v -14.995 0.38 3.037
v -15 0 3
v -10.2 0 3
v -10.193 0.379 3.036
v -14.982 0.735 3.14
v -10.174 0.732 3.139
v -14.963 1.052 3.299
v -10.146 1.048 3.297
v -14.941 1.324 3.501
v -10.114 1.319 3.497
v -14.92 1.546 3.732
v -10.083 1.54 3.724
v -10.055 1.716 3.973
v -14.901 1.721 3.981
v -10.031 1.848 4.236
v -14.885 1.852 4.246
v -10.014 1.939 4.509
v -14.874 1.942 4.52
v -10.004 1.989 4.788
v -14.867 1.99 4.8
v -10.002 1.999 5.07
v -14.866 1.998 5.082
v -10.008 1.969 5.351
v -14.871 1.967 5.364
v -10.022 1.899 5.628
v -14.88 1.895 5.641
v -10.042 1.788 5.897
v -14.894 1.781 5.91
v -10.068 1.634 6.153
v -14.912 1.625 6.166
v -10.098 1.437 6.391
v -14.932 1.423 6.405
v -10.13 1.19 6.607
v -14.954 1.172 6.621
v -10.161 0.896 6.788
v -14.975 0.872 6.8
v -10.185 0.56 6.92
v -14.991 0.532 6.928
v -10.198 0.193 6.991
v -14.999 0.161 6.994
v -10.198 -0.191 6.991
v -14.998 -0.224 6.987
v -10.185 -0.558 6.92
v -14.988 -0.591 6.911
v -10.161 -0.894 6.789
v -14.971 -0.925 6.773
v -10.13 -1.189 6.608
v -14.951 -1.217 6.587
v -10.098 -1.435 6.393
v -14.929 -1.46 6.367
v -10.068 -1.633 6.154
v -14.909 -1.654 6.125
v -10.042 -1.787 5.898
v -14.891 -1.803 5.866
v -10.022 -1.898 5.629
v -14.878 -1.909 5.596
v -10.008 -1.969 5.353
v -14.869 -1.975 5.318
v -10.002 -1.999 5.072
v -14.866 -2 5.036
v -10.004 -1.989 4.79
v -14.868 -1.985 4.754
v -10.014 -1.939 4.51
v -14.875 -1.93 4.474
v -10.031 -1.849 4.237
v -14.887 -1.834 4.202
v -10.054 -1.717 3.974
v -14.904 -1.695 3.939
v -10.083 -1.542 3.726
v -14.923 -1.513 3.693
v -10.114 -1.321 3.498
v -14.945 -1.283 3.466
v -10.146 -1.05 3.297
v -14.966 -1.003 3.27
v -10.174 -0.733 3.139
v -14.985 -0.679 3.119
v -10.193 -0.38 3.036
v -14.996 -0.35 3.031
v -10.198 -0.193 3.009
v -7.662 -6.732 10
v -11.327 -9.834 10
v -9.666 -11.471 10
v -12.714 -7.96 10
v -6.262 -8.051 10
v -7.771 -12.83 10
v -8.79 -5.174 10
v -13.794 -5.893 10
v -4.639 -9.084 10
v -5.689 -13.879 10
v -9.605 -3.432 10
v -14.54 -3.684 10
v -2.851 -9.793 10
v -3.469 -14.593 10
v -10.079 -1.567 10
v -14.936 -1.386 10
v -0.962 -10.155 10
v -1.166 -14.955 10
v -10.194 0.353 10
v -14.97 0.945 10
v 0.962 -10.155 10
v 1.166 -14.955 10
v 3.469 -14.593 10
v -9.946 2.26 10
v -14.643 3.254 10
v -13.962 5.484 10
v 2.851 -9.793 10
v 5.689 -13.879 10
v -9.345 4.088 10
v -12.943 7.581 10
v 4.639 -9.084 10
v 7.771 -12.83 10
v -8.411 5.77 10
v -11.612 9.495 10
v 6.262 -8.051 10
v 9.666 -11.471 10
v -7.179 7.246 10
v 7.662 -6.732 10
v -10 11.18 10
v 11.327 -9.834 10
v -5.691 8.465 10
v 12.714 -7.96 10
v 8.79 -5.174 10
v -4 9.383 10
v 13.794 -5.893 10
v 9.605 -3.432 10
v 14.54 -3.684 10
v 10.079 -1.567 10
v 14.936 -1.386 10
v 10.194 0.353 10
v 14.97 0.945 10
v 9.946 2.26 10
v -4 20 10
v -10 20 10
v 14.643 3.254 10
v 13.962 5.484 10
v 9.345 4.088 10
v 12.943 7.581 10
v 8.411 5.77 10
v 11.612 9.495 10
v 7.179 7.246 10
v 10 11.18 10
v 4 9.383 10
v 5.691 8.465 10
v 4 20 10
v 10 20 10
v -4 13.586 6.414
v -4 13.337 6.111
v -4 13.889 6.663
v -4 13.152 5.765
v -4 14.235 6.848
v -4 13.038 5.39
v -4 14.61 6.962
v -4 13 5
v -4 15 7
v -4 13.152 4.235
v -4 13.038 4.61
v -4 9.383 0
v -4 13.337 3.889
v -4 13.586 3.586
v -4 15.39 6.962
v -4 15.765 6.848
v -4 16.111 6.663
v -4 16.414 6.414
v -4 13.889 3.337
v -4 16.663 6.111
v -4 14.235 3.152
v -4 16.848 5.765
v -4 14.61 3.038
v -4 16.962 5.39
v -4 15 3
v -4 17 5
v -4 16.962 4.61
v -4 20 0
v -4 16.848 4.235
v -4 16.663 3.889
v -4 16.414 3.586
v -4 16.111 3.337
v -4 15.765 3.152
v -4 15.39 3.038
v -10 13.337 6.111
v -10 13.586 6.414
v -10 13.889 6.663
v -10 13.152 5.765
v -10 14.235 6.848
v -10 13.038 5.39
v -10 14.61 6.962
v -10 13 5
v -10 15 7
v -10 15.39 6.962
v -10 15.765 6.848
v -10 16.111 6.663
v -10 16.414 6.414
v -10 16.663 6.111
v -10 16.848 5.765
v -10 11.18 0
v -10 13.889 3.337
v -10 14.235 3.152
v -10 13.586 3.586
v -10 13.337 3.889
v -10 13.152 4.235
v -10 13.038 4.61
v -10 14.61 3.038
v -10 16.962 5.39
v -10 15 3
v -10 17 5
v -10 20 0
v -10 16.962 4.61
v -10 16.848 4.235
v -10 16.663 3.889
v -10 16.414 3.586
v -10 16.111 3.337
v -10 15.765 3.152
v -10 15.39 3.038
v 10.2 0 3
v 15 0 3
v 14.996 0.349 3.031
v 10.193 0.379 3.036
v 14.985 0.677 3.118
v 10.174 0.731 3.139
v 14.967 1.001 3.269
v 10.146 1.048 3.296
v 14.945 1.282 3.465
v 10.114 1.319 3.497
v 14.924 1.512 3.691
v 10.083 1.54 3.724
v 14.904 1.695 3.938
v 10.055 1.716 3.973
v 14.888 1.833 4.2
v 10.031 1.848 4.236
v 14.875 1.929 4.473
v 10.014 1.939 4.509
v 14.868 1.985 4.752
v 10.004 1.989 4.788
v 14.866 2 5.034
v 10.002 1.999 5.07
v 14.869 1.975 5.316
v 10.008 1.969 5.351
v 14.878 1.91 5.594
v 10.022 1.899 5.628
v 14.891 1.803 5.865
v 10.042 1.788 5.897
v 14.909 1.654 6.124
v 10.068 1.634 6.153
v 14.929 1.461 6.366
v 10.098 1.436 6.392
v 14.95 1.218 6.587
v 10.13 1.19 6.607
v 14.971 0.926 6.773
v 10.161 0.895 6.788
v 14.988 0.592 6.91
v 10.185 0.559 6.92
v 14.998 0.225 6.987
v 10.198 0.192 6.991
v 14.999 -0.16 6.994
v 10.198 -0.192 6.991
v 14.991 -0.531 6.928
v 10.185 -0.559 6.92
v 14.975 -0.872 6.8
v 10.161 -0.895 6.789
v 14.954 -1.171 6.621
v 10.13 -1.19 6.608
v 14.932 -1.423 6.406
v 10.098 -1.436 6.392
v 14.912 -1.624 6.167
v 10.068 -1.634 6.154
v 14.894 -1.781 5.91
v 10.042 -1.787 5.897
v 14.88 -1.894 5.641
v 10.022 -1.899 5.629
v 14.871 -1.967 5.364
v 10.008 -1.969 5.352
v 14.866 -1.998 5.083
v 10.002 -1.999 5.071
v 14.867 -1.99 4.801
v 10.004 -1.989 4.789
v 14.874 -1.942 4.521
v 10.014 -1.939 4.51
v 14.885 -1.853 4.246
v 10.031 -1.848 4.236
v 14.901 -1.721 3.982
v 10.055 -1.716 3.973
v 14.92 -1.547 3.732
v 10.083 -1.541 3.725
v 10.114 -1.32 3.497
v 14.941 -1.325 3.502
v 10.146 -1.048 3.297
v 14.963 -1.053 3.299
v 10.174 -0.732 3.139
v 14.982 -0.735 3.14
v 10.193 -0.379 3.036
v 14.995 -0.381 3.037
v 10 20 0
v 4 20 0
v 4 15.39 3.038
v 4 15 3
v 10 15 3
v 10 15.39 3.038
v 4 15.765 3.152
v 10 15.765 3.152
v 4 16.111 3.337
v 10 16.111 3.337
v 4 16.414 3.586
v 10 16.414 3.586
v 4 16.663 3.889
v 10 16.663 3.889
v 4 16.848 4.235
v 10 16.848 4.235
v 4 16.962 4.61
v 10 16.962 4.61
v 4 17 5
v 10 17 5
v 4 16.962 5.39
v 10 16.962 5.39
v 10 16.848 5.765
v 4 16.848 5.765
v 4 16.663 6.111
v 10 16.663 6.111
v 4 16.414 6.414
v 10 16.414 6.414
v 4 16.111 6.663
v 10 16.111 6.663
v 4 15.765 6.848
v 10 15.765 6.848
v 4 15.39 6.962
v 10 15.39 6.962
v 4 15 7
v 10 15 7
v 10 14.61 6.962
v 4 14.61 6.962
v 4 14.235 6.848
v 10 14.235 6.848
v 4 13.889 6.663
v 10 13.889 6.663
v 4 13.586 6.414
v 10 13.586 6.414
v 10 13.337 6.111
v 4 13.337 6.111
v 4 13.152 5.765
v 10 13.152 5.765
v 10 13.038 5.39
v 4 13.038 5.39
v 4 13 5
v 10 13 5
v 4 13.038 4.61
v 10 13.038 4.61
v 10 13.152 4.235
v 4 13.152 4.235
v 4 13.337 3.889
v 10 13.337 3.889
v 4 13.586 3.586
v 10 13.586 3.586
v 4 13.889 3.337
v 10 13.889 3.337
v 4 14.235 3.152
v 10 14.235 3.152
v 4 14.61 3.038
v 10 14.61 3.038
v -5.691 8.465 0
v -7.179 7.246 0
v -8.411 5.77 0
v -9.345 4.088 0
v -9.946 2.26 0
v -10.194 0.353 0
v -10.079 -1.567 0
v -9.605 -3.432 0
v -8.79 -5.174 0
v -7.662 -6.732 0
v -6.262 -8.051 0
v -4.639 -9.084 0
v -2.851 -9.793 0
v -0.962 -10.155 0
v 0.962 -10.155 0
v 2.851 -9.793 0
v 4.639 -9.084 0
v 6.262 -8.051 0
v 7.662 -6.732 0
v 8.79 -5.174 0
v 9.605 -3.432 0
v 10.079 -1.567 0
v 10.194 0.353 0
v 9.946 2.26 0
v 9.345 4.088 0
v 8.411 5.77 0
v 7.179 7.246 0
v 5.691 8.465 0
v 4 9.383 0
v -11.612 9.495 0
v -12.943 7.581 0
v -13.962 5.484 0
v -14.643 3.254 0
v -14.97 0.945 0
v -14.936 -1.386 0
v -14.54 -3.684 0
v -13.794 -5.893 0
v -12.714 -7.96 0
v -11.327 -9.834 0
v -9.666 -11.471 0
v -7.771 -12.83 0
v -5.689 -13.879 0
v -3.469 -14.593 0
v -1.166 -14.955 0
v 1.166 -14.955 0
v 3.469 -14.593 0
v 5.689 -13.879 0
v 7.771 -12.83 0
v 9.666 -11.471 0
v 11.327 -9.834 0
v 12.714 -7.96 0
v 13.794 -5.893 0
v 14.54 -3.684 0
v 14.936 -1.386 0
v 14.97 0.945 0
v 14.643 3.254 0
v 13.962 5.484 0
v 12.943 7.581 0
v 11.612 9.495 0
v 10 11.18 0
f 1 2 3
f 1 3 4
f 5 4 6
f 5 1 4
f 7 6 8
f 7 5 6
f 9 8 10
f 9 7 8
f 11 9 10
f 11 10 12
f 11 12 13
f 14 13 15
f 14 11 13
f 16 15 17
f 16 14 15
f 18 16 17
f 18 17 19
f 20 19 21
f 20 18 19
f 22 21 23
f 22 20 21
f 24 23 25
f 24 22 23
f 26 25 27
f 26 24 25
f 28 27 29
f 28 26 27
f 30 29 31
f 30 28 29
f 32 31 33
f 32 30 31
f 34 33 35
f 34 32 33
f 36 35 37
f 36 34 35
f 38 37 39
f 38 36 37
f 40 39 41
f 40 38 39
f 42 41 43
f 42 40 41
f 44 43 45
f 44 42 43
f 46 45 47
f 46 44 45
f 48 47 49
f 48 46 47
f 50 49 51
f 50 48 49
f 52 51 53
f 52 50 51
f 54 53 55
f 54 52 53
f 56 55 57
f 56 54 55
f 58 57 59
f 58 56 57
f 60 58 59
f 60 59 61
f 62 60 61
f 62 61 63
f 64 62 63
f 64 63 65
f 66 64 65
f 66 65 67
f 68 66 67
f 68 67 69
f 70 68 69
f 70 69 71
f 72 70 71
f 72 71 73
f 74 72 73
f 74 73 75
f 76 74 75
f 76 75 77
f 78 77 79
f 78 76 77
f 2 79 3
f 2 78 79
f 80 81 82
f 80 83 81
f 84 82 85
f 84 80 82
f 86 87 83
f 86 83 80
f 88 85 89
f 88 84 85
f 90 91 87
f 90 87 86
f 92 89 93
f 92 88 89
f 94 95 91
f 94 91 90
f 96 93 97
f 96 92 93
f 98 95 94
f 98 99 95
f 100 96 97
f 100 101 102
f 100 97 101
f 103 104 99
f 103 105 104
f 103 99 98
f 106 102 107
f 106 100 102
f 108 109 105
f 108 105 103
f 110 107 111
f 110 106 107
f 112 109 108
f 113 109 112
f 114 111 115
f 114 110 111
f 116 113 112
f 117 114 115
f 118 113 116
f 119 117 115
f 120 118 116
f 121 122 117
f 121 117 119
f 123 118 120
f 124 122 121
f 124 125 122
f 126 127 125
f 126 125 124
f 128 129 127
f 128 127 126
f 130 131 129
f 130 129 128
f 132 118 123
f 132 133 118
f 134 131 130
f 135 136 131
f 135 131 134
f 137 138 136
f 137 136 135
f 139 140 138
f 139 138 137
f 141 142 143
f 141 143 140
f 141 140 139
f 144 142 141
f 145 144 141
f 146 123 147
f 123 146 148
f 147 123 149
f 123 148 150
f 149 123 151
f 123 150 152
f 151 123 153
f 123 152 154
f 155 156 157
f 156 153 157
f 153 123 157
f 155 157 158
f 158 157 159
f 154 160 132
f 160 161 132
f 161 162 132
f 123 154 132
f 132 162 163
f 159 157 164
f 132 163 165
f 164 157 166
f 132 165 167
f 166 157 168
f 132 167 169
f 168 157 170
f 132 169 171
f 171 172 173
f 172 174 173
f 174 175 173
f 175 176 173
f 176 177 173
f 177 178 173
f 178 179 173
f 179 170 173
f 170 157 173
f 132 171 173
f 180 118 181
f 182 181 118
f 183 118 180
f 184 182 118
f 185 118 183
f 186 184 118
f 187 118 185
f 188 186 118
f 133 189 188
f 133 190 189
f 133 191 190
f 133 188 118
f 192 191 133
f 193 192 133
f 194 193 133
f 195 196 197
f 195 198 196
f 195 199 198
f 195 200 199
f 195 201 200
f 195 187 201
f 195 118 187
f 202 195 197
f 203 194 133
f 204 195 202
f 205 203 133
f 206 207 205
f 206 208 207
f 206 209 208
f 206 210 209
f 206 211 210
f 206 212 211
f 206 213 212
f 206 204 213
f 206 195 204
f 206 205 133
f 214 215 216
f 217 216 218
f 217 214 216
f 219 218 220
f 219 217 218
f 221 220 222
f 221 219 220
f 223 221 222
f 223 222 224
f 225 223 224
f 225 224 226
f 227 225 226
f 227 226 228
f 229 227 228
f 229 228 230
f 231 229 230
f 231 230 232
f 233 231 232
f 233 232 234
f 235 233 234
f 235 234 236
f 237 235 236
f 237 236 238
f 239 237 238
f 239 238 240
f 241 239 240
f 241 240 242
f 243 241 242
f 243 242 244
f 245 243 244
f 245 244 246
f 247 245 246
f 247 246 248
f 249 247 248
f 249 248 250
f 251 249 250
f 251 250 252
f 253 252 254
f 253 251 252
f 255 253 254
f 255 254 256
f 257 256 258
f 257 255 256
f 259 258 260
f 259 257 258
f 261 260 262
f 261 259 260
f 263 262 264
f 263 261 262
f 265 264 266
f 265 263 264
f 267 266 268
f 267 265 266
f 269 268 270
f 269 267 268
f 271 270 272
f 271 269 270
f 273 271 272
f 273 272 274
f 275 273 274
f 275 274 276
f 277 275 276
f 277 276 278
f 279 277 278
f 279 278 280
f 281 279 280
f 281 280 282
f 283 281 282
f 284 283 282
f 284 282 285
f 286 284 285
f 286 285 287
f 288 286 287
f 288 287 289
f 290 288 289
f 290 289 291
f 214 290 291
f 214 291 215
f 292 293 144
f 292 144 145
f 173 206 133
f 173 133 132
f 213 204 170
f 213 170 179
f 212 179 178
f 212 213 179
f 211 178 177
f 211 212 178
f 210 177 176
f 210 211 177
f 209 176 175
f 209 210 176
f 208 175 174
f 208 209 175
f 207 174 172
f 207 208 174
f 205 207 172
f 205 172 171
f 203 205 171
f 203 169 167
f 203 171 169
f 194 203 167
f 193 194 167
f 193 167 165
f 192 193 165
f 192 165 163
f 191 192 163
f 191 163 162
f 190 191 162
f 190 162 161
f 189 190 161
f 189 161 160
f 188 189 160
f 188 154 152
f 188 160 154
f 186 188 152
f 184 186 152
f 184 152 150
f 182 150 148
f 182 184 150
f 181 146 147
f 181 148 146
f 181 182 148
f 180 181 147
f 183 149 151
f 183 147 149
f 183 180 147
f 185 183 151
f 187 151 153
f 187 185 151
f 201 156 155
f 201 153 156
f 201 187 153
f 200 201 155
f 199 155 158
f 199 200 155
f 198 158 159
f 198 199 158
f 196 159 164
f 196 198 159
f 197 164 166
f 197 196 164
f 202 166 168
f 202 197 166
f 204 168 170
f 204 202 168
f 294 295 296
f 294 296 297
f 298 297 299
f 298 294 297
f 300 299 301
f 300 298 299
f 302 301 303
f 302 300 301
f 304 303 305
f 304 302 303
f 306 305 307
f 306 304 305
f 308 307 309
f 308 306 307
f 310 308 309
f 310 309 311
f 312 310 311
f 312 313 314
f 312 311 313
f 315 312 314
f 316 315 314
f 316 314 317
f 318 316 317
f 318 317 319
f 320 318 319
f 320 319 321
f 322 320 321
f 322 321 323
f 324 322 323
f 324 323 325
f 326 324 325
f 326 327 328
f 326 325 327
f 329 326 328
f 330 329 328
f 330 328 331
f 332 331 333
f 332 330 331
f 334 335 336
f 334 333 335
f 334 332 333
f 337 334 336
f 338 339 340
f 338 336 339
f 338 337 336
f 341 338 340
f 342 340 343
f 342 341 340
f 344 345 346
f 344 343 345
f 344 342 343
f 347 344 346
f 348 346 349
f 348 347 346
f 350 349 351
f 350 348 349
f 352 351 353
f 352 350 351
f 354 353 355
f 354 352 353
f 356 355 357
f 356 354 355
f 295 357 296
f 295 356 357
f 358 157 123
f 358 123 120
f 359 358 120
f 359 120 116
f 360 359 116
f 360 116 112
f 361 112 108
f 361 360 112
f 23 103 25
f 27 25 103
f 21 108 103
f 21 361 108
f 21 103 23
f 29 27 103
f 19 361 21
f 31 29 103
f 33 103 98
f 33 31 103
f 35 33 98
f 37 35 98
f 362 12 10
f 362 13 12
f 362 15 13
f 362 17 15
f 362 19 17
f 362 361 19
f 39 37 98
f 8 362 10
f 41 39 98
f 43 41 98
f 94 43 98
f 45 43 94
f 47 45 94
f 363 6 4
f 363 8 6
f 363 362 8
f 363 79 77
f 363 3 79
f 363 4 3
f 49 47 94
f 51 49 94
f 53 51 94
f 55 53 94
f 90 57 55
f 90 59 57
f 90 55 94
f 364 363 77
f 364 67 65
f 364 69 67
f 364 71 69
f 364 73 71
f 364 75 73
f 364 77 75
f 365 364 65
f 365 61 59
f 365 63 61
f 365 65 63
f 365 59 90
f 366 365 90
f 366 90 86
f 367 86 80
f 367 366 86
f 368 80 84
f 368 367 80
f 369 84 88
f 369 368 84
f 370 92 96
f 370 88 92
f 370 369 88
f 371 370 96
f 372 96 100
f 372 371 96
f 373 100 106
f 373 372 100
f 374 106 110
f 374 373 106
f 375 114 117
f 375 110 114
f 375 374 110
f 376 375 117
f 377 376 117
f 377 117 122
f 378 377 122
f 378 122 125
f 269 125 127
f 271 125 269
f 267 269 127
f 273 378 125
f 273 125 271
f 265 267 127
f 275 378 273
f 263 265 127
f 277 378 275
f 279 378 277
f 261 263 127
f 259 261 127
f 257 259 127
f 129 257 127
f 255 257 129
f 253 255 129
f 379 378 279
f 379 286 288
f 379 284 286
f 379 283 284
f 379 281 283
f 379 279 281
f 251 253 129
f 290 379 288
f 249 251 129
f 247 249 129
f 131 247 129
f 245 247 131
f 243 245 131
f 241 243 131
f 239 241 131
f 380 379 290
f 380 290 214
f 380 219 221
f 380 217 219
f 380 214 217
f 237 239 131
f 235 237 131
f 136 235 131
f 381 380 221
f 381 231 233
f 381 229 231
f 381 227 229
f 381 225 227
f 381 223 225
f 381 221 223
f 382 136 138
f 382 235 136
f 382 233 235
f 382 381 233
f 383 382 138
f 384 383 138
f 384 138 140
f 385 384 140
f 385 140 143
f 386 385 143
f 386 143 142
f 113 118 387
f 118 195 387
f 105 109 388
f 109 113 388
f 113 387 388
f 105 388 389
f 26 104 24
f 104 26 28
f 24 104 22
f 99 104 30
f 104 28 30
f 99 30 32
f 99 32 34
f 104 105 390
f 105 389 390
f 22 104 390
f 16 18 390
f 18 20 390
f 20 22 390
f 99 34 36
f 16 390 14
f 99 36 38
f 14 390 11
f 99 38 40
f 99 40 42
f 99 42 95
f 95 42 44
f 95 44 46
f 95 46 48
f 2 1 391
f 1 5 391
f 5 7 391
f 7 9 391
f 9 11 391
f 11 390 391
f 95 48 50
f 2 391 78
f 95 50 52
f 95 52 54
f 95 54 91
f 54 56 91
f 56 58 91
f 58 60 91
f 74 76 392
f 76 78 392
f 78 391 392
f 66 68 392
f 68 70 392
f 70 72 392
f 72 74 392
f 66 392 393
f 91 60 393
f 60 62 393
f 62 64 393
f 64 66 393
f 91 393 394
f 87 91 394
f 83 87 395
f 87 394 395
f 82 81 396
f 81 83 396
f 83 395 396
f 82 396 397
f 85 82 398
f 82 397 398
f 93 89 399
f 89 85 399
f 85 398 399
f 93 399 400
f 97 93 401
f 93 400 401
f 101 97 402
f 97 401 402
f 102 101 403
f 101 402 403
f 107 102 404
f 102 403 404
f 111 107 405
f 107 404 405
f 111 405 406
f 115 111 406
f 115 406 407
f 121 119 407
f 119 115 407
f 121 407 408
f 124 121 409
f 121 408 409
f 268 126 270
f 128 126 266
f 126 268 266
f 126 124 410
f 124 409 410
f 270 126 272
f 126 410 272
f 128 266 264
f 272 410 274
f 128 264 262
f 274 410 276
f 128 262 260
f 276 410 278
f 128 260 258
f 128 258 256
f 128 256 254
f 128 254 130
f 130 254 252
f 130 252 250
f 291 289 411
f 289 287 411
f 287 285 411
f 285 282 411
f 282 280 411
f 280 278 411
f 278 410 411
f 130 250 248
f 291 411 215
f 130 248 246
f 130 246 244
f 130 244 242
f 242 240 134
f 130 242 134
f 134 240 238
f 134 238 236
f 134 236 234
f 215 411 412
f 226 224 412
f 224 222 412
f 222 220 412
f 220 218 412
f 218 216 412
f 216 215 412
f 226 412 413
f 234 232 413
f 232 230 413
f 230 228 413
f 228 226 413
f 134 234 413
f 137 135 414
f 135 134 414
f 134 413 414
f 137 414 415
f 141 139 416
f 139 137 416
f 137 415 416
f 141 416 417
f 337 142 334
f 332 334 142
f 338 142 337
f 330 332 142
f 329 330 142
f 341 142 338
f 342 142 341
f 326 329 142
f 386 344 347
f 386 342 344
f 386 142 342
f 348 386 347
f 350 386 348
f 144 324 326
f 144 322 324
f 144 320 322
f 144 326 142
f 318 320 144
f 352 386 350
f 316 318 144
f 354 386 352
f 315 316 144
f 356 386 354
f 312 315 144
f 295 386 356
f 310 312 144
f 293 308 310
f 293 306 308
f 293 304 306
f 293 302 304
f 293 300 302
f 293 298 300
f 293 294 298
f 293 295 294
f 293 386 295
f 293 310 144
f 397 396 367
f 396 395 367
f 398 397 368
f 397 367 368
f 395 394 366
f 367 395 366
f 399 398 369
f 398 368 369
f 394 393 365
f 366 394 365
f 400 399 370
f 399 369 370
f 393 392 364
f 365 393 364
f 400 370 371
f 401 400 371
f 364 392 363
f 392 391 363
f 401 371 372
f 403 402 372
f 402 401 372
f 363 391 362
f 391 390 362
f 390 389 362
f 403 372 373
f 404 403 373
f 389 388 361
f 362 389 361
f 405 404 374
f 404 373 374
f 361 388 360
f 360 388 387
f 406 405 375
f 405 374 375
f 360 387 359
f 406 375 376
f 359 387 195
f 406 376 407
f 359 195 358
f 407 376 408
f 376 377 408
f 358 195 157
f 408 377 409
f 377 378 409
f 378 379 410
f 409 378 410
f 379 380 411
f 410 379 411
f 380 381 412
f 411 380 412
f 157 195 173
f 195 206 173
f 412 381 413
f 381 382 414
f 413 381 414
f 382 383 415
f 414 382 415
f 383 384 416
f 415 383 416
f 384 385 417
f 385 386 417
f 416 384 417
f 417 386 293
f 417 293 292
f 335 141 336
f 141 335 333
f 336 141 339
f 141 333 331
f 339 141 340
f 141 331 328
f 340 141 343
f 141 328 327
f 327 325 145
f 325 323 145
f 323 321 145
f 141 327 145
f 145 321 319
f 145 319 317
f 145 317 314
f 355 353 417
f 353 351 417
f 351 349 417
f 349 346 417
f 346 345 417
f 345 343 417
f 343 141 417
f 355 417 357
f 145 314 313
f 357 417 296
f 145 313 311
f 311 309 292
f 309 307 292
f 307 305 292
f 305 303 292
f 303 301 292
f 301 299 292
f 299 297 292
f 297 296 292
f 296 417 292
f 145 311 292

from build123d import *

# Parameters (mm, degrees)
CYLINDER003_R     = 2
CYLINDER003_DEPTH = 40
CYLINDER002_R     = 2
CYLINDER002_DEPTH = 40
CYLINDER001_R     = 10.2
CYLINDER001_DEPTH = 10
BOX001_W          = 8
BOX001_H          = 15
BOX001_DEPTH      = 10
BOX_W             = 20
BOX_H             = 10
BOX_DEPTH         = 10
CYLINDER_R        = 15
CYLINDER_DEPTH    = 10


with BuildPart() as cylinder003:
    # Cylinder003 → Cylinder003 (new body)
    with BuildSketch(Plane(origin=(-20, 15, 5), x_dir=(0, 0, -1), z_dir=(1, 0, 0))):
        Circle(CYLINDER003_R)
    extrude(amount=CYLINDER003_DEPTH)


with BuildPart() as cylinder002:
    # Cylinder002 → Cylinder002 (new body)
    with BuildSketch(Plane(origin=(-20, 0, 5), x_dir=(0, 0, -1), z_dir=(1, 0, 0))):
        Circle(CYLINDER002_R)
    extrude(amount=CYLINDER002_DEPTH)


with BuildPart() as cylinder001:
    # Cylinder001 → Cylinder001 (new body)
    with BuildSketch(Plane.XY):
        Circle(CYLINDER001_R)
    extrude(amount=CYLINDER001_DEPTH)


with BuildPart() as negative_fusion:
    # Box001 → Box001 (new body)
    with BuildSketch(Plane(origin=(-4, 5, 0), x_dir=(1, 0, 0), z_dir=(0, 0, 1))):
        with Locations((4, 7.5)):
            Rectangle(BOX001_W, BOX001_H)
    extrude(amount=BOX001_DEPTH)

    # Fusion001: union Cylinder003, Cylinder002, Cylinder001
    add(cylinder003.part)
    add(cylinder002.part)
    add(cylinder001.part)


with BuildPart() as cube:
    # Box → Box (new body)
    with BuildSketch(Plane(origin=(-10, 10, 0), x_dir=(1, 0, 0), z_dir=(0, 0, 1))):
        with Locations((10, 5)):
            Rectangle(BOX_W, BOX_H)
    extrude(amount=BOX_DEPTH)


with BuildPart() as cut:
    # Cylinder → Cylinder (new body)
    with BuildSketch(Plane.XY):
        Circle(CYLINDER_R)
    extrude(amount=CYLINDER_DEPTH)

    # Fusion: union Cube
    add(cube.part)

    # Cut: cut Negative Fusion
    add(negative_fusion.part, mode=Mode.SUBTRACT)


solid = cut.part
